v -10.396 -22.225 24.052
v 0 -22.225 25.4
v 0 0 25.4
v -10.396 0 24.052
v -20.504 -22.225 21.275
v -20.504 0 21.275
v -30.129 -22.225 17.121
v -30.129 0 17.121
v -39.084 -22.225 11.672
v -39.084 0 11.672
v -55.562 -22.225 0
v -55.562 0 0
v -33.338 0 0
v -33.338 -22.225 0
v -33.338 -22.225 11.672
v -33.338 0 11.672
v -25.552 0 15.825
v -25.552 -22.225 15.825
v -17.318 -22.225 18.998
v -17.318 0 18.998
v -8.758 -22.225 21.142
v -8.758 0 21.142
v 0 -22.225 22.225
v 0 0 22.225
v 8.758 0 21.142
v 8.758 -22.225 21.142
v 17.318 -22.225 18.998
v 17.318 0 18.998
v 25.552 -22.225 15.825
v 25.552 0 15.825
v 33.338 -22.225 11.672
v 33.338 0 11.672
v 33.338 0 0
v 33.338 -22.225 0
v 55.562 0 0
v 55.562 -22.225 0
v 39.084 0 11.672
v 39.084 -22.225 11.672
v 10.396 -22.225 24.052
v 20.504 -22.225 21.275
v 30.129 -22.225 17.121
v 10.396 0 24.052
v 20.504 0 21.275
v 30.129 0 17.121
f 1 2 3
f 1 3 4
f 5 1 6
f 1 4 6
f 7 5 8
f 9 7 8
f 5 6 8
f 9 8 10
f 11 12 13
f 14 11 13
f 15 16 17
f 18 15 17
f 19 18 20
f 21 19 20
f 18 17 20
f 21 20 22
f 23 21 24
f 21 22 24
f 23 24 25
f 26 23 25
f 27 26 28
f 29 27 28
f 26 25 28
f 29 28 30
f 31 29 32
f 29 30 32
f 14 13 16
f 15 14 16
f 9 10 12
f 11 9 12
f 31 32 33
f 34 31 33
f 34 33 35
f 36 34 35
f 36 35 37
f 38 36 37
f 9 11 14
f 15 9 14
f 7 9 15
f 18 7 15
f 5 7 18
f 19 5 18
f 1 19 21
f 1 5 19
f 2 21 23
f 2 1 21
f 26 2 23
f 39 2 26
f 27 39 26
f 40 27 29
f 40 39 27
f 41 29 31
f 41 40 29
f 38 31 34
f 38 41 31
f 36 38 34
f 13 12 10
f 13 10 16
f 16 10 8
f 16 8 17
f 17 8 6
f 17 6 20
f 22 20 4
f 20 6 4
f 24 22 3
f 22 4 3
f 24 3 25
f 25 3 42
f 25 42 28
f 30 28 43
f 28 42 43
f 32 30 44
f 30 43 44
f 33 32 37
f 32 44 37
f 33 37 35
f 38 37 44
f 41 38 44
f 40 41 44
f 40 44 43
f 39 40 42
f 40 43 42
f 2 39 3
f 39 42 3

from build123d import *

# Parameters (mm, degrees)
F1_DEPTH = 22.225


with BuildPart() as f1:
    # F0 (on Front) → F1 (new body)
    with BuildSketch(Plane.XZ):
        with BuildLine():
            Line((-39.084297, 11.671778), (-55.5625, 0))
            Line((-55.5625, 0), (-33.3375, 0))
            Line((-33.3375, 0), (-33.3375, 11.671778))
            ThreePointArc((-33.3375, 11.671778), (-17.317547, 18.99793), (0, 22.225))
            ThreePointArc((0, 22.225), (17.317547, 18.99793), (33.3375, 11.671778))
            Line((33.3375, 11.671778), (33.3375, 0))
            Line((33.3375, 0), (55.5625, 0))
            Line((55.5625, 0), (39.084297, 11.671778))
            ThreePointArc((39.084297, 11.671778), (20.504205, 21.274866), (0, 25.4))
            ThreePointArc((0, 25.4), (-20.504205, 21.274866), (-39.084297, 11.671778))
        make_face()
    extrude(amount=F1_DEPTH)


solid = f1.part
